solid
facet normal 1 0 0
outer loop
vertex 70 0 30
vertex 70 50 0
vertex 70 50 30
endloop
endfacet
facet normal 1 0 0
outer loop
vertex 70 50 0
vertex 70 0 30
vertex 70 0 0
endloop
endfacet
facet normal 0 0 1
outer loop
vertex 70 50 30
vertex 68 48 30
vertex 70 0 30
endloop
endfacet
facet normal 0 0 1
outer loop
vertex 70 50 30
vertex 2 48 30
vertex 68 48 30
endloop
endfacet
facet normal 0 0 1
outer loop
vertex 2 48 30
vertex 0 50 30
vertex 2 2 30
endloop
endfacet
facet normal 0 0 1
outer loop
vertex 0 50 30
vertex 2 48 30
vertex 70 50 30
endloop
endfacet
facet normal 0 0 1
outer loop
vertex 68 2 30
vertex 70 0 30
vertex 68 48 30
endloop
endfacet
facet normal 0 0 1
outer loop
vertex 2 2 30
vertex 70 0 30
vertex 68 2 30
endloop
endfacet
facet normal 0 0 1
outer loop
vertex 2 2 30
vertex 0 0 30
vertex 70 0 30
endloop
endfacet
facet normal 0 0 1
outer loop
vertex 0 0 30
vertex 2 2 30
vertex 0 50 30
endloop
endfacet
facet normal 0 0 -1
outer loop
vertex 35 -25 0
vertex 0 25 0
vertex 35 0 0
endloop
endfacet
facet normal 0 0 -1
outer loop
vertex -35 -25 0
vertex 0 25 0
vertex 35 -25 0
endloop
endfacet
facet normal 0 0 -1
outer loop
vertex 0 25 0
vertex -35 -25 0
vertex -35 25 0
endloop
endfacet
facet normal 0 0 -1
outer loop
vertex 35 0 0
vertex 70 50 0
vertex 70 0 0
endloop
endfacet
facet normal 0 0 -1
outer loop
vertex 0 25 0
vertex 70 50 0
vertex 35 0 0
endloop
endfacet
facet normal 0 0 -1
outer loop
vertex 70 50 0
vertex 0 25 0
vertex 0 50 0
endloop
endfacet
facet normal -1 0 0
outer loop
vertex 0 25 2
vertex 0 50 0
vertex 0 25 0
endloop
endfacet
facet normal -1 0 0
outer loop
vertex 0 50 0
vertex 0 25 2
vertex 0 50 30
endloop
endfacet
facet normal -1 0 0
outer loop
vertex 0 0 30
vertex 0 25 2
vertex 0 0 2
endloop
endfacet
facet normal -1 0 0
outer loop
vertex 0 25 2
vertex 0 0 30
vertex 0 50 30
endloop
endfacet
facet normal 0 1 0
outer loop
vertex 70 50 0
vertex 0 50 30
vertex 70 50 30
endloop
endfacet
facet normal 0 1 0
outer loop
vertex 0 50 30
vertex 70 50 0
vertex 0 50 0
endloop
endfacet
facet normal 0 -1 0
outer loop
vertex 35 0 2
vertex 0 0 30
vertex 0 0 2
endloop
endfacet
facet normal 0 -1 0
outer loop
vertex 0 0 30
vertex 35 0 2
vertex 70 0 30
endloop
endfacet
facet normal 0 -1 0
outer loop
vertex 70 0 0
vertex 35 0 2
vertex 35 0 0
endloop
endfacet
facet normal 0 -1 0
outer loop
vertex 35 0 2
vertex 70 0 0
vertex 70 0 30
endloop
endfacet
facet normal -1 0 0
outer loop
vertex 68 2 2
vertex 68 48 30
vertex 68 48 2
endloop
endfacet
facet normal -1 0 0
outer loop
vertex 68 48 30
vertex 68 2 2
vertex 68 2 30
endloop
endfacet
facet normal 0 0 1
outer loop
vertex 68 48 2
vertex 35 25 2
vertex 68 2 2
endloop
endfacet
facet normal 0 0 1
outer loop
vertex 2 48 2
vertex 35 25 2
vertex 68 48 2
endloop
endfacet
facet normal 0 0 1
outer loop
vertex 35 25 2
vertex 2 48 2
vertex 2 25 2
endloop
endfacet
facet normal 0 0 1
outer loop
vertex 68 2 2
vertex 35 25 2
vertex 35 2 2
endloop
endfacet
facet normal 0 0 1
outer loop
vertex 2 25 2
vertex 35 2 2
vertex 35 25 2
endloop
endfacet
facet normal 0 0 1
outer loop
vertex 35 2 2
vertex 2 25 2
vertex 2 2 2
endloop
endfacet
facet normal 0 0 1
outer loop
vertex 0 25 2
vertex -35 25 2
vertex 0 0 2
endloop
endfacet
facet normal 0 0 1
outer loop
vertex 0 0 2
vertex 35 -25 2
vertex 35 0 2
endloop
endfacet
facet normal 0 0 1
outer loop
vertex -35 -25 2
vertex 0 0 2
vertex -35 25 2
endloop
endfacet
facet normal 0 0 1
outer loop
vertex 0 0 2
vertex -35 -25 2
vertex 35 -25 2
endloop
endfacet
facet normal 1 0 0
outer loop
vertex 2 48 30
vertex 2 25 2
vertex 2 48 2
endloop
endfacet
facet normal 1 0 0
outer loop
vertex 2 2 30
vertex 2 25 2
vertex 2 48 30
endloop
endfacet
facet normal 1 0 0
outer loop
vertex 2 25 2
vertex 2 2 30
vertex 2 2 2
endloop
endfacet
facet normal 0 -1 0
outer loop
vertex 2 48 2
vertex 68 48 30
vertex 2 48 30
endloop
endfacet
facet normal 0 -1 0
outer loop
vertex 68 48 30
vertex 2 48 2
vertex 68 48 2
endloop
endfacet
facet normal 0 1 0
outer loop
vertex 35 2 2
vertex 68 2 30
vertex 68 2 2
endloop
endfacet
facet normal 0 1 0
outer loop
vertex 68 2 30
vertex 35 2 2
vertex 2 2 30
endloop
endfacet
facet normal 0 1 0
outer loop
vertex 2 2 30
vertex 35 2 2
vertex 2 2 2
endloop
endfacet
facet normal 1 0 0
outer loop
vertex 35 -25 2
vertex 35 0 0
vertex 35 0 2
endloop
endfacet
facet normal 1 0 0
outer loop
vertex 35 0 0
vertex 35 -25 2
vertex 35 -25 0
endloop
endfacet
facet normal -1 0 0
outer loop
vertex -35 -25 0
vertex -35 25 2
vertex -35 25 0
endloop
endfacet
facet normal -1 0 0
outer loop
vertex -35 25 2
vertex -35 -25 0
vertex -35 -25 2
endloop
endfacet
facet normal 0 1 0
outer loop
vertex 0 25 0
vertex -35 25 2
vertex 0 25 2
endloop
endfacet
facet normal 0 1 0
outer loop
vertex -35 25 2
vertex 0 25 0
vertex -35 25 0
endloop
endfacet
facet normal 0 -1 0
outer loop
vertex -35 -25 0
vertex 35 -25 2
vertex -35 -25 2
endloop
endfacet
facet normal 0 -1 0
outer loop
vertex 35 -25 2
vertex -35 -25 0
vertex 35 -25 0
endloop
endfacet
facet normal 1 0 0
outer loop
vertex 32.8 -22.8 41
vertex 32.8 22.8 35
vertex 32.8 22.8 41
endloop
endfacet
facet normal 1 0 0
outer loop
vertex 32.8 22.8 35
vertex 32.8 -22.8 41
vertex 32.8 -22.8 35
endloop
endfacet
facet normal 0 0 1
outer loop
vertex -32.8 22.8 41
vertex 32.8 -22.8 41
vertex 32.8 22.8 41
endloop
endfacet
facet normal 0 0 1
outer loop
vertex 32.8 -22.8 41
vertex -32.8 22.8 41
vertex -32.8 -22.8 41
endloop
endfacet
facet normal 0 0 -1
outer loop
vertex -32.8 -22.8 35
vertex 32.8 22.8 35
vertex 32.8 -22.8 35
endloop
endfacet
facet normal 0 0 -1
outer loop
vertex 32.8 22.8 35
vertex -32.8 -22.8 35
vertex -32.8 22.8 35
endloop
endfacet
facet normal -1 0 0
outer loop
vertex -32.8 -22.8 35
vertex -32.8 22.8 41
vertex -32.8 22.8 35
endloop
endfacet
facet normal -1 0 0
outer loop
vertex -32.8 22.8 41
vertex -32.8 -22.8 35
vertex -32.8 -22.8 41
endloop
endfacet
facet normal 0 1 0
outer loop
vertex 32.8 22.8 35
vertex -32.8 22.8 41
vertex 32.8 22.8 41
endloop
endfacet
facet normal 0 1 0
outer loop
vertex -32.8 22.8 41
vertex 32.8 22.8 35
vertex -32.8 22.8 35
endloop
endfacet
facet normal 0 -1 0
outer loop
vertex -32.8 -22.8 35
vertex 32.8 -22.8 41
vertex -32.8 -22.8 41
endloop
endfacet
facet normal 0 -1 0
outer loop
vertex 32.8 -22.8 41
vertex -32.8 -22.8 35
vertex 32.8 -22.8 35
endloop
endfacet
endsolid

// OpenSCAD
// Two-part enclosure for a small electronics board (e.g. Arduino-based temperature logger)
// Print orientation: both parts rest on the XY plane at z = 0, side by side on the bed.
// The lid is printed upside down: a flat plate with a rectangular lip that slides into the
// box opening with 0.2 mm clearance on each side.
//

// ---------------- Parameters ----------------
box_x      = 70;    // box outer length (X)
box_y      = 50;    // box outer width (Y)
box_h      = 30;    // box outer height (Z)
wall       = 2;     // box wall thickness
floor      = 2;     // box floor thickness
lip_t      = 1.5;   // lip wall thickness
lip_h      = 4;     // lip height above plate
lip_x      = 65.6;  // lip outer length (X)
lip_y      = 45.6;  // lip outer width (Y)
clearance  = 0.2;   // clearance between lip outer size and box opening
gap        = 10;    // gap between box and lid on the bed
eps        = 0.5;   // cutter overshoot past faces

$fn = 64;

// Derived: box opening size = outer - 2*wall
opening_x = box_x - 2 * wall;   // 66
opening_y = box_y - 2 * wall;   // 46
// Lip check: outer 65.6 x 45.6 -> 0.2 mm clearance on each side inside the opening

// ---------------- Model ----------------
union() {
    // Part 1: Box (open top)
    difference() {
        cube([box_x, box_y, box_h]);
        // Cut open top: shape extends past the top face
        translate([wall, wall, floor])
            cube([opening_x, opening_y, box_h - floor + eps]);
    }

    // Part 2: Lid (printed upside down)
    // Plate lying on the bed, with a rectangular lip on top of it
    union() {
        // Base plate
        translate([-box_x / 2, -box_y / 2, 0])
            cube([box_x, box_y, 2]);   // 2 mm plate

        // Lip centred on the plate
        translate([-lip_x / 2, -lip_y / 2, box_y / 2 + gap])
            cube([lip_x, lip_y, lip_h + wall]);
    }
}
